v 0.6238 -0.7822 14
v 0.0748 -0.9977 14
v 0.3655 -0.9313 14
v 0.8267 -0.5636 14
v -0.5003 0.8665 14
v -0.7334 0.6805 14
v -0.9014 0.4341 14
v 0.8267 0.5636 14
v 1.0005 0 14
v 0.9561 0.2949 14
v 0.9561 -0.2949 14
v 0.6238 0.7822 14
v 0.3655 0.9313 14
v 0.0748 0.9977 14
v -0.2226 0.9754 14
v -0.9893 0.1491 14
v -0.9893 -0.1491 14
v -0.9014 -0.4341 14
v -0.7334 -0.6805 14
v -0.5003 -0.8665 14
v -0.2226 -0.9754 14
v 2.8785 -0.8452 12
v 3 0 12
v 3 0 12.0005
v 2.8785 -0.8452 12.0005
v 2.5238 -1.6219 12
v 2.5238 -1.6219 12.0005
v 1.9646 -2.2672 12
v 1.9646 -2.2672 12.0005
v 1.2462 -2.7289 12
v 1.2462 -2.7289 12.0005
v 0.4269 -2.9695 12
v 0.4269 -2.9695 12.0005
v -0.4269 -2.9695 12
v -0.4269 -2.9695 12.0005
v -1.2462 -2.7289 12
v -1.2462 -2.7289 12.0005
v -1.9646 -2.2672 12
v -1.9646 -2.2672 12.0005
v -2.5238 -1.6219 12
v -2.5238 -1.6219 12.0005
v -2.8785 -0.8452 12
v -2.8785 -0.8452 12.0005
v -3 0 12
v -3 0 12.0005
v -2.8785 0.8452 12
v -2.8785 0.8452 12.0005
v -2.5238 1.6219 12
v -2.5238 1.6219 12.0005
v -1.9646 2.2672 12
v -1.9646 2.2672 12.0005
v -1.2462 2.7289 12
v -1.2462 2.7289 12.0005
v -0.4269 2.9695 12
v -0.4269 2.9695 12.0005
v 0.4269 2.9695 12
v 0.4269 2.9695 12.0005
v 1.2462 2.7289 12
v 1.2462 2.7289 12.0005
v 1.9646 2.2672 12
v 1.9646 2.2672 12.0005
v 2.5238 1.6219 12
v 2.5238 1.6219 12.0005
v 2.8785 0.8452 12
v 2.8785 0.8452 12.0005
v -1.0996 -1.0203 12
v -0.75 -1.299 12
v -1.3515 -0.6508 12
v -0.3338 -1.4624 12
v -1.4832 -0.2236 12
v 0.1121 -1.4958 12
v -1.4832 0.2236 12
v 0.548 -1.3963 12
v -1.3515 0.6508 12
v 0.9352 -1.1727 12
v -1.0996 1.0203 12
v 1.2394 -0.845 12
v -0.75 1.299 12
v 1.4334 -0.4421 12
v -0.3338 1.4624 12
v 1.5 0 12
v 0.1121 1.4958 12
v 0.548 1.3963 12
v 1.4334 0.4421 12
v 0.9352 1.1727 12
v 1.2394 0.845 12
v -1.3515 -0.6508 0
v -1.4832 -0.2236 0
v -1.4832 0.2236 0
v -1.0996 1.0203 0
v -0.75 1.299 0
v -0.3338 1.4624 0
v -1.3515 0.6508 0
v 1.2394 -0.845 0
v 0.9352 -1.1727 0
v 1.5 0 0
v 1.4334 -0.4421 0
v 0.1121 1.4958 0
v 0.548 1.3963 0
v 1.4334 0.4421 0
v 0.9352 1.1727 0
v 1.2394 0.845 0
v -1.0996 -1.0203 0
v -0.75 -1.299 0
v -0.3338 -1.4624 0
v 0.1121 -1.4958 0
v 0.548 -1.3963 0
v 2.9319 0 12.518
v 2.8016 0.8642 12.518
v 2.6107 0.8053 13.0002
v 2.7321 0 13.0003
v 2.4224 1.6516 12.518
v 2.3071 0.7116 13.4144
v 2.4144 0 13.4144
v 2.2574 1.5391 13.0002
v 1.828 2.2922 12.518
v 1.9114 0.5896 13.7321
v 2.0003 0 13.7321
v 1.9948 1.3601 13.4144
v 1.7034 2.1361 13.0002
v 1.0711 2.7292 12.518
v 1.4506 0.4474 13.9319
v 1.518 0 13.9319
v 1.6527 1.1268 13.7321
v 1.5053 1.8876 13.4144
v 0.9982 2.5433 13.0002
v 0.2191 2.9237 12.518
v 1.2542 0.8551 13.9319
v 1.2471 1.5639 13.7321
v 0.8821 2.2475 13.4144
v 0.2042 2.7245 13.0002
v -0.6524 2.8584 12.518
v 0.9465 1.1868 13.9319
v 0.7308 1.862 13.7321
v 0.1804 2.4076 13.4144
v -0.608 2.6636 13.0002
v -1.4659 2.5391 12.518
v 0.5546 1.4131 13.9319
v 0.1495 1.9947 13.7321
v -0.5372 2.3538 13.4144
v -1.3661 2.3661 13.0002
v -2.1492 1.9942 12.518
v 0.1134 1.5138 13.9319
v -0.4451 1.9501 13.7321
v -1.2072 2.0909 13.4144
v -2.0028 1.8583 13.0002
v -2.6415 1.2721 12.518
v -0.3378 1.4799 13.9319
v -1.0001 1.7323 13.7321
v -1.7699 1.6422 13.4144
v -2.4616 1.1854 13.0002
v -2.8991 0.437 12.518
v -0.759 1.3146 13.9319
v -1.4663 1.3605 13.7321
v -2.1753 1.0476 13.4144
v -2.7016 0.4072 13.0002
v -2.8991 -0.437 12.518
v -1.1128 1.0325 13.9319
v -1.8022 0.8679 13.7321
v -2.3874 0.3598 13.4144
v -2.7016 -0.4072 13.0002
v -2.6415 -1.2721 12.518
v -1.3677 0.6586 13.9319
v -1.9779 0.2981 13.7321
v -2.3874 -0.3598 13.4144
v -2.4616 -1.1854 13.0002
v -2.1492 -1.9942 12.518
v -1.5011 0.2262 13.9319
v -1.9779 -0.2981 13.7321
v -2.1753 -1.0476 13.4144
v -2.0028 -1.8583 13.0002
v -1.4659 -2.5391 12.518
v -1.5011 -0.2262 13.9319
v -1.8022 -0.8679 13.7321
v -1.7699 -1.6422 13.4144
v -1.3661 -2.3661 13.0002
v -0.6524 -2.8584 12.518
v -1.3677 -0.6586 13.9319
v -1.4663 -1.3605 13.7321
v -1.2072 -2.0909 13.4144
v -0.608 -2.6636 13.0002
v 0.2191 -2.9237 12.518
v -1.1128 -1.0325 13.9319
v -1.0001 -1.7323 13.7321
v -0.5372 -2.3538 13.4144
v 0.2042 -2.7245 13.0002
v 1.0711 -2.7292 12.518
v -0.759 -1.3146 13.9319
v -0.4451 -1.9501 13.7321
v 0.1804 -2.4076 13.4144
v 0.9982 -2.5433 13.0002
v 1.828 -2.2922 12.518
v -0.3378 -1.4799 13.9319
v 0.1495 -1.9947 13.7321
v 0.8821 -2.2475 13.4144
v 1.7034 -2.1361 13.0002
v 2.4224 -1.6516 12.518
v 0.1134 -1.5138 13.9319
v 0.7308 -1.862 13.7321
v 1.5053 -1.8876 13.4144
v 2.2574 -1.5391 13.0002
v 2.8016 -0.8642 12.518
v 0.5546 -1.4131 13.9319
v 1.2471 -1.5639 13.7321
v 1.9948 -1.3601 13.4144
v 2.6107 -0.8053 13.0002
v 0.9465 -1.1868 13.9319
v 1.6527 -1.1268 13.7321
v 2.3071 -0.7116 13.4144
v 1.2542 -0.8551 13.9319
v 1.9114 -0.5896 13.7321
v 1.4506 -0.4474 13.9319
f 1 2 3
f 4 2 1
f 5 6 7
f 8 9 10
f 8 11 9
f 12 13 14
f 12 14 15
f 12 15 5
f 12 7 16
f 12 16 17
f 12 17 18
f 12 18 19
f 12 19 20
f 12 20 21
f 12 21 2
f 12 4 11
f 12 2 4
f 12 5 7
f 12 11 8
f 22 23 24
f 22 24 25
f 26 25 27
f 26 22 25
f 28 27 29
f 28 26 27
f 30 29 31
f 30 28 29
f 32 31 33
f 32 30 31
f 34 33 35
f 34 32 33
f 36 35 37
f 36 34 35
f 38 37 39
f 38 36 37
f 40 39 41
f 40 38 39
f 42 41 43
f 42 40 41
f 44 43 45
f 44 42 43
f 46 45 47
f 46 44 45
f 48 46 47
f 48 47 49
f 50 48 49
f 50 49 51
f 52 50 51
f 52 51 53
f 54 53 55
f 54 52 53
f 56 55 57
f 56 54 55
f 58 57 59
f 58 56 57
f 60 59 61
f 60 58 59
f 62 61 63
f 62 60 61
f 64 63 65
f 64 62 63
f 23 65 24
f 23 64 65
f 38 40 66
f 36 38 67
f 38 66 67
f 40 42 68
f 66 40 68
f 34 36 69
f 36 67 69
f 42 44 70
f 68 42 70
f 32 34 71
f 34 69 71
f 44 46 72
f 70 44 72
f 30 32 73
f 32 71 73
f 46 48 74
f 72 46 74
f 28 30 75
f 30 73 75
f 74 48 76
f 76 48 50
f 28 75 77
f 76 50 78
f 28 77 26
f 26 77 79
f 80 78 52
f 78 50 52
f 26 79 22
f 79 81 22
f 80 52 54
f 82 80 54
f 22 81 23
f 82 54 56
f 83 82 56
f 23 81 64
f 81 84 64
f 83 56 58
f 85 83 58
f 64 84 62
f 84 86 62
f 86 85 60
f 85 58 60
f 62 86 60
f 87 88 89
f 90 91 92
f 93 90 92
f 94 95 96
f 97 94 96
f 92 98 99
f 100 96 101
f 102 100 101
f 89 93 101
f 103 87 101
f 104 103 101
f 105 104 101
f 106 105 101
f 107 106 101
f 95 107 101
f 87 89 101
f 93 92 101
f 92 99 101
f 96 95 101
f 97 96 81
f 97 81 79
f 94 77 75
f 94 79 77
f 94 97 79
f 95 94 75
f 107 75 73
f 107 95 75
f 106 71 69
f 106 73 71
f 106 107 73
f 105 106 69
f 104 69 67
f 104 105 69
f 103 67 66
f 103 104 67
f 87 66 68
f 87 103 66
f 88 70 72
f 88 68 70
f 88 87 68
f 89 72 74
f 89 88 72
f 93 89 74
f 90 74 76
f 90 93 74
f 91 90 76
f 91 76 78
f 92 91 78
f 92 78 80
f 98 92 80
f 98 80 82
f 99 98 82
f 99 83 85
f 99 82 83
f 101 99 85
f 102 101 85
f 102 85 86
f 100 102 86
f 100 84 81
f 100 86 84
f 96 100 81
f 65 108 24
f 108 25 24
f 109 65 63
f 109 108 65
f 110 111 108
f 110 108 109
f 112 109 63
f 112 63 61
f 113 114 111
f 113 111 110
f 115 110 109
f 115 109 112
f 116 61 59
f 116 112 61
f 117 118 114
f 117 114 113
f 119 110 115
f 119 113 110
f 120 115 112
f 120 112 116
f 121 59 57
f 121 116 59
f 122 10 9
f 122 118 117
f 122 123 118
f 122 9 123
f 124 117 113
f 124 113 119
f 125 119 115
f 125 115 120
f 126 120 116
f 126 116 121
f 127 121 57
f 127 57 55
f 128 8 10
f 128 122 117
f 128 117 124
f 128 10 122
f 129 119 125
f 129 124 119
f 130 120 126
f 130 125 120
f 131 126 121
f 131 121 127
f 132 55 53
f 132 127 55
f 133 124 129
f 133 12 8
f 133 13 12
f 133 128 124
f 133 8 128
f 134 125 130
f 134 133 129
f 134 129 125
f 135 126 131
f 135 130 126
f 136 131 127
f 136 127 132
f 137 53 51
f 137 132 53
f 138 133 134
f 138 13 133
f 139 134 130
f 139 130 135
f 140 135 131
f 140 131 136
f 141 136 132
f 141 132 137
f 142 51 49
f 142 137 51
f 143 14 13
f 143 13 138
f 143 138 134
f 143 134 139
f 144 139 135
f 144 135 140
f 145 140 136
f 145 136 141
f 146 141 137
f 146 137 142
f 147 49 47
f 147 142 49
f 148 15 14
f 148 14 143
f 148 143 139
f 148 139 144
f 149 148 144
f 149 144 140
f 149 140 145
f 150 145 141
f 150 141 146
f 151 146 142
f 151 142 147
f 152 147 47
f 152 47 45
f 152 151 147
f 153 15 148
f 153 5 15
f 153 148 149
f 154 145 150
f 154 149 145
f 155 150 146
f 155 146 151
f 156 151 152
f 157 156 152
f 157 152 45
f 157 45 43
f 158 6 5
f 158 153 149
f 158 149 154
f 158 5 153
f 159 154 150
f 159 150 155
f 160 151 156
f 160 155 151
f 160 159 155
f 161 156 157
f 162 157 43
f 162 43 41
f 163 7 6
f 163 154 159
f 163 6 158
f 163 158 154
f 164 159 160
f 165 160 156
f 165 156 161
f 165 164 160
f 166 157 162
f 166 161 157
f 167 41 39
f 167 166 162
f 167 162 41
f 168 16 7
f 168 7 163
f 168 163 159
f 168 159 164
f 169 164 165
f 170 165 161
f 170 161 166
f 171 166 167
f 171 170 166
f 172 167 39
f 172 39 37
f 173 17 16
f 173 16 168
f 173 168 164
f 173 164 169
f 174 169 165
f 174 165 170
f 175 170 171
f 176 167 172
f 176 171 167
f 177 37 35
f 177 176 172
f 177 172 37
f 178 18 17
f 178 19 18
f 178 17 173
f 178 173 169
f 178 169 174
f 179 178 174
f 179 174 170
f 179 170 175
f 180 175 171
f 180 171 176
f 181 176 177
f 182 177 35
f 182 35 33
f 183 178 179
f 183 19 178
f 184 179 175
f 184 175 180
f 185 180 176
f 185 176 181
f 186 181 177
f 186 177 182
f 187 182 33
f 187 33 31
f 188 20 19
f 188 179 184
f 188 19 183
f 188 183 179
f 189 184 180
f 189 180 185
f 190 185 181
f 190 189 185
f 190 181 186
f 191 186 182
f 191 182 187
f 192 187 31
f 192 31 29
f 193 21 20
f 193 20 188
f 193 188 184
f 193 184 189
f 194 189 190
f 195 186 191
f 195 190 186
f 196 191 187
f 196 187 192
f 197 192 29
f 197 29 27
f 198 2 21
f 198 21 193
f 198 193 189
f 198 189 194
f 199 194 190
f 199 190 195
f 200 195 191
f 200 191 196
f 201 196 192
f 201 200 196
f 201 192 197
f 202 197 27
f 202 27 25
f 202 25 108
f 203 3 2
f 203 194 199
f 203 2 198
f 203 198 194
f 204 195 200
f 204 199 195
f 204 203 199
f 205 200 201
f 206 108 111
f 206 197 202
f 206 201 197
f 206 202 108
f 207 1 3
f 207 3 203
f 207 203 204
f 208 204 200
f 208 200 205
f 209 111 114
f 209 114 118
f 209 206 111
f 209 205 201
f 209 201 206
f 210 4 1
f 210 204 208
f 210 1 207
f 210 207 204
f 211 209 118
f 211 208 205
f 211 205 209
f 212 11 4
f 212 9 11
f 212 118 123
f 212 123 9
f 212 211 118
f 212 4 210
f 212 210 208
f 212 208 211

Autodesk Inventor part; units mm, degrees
ref_plane "YZ Plane" through (0, 0, 0) normal (1, 0, 0) x (0, 1, 0)
ref_plane "XZ Plane" through (0, 0, 0) normal (0, 1, 0) x (-1, 0, 0)
ref_plane "XY Plane" through (0, 0, 0) normal (0, 0, 1) x (1, 0, 0)
sketch "スケッチ1" plane through (0, 0, 0) normal (0, 0, 1) x (1, 0, 0)
  circle A0 centre (0, 0) radius 1.5
  dimension "d0" = 3
extrude "押し出し1" add sketch "スケッチ1" along normal blind 12
sketch "スケッチ2" plane through (0, 0, 12) normal (0, 0, 1) x (1, 0, 0)
  circle A0 centre (0, 0) radius 1.5 projected
  circle A1 centre (0, 0) radius 3
  dimension "d3" = 6
extrude "押し出し2" add sketch "スケッチ2" along normal blind 2 contours A0 | A1
fillet "フィレット1" radius 2 1 edges at (-3, 0, 14)
properties part number "M3ボタンボルト12" material "鋼、高強度、低合金"
